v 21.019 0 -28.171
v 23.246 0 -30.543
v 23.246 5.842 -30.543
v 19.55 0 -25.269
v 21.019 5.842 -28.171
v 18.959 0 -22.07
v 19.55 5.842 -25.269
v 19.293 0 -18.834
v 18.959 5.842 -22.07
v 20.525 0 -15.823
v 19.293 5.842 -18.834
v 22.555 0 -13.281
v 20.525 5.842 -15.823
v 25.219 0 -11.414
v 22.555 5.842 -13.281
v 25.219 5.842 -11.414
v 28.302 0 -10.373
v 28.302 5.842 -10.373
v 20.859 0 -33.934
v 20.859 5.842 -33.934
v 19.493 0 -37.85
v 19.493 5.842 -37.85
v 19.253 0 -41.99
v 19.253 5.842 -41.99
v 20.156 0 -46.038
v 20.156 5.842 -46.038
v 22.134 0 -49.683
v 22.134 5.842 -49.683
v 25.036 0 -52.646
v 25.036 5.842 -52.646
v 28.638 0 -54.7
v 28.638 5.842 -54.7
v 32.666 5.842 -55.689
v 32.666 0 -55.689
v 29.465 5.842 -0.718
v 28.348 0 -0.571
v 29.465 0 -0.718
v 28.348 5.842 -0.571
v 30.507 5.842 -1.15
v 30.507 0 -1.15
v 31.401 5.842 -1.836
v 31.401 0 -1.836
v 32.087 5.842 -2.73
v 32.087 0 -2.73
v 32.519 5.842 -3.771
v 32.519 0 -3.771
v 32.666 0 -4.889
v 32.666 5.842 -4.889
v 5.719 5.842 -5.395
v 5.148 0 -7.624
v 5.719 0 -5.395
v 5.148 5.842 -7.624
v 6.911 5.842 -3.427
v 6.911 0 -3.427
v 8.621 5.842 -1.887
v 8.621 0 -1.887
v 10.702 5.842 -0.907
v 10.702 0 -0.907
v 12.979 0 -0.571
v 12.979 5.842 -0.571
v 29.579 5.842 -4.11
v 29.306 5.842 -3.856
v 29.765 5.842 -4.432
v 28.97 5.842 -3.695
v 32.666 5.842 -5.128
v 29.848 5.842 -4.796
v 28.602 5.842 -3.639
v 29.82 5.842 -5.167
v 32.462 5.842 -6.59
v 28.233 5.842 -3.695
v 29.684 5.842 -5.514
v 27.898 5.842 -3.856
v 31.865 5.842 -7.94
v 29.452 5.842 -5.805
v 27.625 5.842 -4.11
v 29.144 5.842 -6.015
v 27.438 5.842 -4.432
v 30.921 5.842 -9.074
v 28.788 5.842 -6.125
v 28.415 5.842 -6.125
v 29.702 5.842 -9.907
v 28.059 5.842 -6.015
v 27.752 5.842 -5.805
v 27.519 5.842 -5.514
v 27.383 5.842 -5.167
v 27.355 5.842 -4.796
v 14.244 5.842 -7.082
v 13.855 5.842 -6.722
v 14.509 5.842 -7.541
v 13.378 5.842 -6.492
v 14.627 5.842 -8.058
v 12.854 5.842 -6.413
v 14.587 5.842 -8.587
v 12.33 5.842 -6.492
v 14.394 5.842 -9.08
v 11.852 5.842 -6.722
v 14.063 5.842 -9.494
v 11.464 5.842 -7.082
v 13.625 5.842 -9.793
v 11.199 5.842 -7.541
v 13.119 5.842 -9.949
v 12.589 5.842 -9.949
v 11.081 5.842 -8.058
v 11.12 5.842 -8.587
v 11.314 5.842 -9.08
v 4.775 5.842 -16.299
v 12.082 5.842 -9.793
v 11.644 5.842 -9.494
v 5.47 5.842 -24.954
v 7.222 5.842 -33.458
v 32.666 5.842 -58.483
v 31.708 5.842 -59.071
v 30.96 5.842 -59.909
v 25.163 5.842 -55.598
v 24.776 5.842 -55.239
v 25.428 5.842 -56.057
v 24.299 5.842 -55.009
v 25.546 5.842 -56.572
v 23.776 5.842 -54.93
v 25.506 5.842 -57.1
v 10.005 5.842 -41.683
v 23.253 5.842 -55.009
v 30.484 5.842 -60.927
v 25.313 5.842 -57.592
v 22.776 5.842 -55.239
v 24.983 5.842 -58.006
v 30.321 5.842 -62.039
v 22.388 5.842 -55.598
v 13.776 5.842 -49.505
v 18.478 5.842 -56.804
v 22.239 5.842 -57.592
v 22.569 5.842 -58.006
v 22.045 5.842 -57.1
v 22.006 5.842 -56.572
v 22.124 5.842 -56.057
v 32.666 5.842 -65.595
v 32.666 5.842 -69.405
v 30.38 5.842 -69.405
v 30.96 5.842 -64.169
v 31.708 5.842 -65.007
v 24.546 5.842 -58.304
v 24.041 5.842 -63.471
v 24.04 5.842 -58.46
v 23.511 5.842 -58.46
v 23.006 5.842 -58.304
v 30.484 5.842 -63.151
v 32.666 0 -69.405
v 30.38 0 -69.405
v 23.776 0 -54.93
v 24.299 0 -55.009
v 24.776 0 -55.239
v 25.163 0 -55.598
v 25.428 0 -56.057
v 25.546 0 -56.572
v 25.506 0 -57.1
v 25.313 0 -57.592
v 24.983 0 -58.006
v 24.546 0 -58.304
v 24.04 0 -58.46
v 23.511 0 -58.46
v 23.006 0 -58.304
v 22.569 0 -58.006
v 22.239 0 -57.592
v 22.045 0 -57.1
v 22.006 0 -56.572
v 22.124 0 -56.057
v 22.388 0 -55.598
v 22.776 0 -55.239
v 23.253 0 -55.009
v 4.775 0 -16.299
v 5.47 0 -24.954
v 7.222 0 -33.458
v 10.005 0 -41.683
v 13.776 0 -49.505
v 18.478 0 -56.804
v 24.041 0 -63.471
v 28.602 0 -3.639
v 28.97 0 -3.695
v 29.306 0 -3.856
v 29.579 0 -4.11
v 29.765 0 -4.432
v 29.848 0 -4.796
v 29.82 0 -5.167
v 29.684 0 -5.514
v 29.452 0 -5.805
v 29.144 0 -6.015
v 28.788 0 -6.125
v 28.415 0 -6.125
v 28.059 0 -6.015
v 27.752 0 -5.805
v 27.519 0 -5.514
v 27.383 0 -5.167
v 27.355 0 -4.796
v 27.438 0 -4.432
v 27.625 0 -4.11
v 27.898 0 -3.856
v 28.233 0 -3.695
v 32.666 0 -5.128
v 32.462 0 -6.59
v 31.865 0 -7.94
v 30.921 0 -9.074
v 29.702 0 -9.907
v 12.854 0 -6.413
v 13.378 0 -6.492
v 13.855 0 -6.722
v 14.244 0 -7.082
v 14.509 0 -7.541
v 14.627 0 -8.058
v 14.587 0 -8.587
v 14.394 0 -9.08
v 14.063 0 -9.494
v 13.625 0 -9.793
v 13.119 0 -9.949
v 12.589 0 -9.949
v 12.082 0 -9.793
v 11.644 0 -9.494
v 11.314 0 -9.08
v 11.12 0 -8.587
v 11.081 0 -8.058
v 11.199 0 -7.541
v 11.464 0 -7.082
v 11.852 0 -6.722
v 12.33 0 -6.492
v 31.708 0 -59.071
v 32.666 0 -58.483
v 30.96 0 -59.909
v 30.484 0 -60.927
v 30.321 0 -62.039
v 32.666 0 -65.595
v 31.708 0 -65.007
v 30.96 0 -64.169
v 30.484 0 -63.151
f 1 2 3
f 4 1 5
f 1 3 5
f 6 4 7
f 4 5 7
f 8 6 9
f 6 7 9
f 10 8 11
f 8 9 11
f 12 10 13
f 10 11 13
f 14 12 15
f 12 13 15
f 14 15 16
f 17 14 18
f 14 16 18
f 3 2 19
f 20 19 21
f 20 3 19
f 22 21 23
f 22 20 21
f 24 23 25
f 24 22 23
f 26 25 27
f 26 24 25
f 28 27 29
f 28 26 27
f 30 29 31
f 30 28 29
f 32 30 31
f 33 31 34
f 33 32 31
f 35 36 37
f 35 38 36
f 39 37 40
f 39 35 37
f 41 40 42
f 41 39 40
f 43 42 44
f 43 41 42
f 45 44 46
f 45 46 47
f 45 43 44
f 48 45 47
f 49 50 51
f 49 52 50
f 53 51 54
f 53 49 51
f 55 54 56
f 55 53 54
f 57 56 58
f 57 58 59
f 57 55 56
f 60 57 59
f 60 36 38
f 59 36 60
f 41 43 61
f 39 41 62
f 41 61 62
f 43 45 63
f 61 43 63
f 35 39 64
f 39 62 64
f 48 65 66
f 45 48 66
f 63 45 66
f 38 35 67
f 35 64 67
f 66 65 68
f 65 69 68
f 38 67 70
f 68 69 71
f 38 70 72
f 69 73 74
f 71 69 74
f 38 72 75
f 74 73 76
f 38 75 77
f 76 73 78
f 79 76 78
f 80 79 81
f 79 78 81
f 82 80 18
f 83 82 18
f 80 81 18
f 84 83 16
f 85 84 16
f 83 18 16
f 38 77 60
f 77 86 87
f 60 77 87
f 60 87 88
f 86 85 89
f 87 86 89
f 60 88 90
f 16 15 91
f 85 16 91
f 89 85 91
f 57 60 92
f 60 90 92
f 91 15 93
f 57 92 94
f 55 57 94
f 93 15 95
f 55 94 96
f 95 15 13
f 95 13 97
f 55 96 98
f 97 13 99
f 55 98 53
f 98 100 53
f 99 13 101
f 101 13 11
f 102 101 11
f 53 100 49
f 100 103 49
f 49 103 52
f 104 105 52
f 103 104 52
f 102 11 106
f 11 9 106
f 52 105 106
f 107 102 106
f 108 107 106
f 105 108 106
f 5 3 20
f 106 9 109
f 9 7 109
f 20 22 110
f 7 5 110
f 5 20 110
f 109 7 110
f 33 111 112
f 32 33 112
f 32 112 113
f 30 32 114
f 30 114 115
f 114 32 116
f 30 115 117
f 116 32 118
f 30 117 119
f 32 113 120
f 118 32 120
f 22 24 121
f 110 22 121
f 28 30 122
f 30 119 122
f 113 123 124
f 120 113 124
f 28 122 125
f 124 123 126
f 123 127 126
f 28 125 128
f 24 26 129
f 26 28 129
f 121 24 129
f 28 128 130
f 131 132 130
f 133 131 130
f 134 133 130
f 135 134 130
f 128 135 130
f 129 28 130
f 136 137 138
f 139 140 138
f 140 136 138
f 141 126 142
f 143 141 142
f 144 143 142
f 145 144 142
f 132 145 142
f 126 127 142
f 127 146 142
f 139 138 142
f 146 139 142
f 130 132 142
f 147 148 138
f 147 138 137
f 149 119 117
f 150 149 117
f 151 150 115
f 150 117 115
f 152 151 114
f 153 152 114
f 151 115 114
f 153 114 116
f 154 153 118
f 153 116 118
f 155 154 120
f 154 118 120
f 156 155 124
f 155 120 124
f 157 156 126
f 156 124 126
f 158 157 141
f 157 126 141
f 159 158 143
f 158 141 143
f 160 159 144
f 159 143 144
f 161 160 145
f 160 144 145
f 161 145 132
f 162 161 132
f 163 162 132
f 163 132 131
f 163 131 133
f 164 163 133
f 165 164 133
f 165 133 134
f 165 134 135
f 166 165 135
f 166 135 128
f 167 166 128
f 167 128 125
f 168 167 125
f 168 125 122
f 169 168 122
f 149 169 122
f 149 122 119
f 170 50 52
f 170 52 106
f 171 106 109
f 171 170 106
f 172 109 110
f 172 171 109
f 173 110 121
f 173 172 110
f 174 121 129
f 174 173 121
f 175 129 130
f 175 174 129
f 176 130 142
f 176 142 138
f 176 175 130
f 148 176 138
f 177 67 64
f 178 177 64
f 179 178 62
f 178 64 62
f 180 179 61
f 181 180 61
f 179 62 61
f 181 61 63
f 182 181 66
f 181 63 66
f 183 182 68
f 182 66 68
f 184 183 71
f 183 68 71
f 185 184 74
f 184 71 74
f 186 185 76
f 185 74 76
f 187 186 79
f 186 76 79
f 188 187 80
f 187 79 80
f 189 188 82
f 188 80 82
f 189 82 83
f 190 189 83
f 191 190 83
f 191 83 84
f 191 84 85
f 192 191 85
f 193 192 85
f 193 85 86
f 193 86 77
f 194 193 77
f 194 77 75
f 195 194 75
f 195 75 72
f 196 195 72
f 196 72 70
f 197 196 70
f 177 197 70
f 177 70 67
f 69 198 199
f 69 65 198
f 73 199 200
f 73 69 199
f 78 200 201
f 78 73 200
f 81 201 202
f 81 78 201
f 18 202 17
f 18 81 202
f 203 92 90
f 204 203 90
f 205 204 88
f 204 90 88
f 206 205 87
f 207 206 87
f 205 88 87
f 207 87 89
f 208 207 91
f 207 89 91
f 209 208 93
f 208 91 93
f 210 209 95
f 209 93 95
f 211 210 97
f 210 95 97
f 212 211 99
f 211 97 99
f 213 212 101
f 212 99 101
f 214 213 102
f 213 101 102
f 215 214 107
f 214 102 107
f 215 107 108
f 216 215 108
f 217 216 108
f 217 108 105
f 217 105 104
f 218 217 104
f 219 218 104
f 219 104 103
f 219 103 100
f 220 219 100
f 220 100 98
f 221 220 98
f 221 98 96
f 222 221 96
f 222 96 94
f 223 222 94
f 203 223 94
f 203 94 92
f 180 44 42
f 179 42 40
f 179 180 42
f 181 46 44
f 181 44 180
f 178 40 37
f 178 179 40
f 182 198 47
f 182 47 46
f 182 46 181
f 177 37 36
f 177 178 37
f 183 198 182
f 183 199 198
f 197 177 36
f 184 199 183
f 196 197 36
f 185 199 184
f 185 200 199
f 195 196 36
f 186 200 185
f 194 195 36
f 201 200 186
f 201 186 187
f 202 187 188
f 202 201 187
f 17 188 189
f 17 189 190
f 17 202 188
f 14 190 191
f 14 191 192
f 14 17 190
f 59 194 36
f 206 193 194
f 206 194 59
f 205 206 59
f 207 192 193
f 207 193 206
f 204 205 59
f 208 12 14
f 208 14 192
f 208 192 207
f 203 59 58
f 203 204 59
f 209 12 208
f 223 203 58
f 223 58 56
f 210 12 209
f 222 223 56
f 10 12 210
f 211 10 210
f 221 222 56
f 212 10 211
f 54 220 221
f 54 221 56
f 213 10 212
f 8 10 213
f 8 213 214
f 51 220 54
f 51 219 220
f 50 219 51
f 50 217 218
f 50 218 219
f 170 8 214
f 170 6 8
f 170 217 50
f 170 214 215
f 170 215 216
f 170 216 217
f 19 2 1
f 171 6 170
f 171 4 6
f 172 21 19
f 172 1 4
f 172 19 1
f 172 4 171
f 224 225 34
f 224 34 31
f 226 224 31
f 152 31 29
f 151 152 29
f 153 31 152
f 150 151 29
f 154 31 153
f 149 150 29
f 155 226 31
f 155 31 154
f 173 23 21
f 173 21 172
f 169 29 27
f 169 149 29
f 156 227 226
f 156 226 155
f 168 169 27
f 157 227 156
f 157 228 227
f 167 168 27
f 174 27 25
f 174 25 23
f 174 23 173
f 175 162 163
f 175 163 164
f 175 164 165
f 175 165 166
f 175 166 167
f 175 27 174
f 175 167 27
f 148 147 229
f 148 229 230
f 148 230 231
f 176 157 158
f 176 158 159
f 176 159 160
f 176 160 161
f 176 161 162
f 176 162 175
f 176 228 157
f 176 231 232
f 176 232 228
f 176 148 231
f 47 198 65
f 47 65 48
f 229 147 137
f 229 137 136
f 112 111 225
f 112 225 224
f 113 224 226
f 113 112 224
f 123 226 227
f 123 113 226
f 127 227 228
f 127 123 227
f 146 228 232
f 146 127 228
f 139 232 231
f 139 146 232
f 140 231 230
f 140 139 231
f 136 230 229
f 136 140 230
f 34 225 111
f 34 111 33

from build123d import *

# Parameters (mm, degrees)
BOSS_EXTRUDE1_DEPTH = 5.842
CUT_EXTRUDE1_DEPTH  = 77.930082101
CUT_EXTRUDE2_DEPTH  = 77.930082101
SKETCH8_R           = 11.43
CUT_EXTRUDE3_DEPTH  = 77.930082101
FILLET1_R           = 7.874
FILLET2_R           = 4.318
FILLET4_R           = 5.334
SKETCH9_R           = 1.774805699
CUT_EXTRUDE4_DEPTH  = 77.930082101
SKETCH10_R          = 1.25
CUT_EXTRUDE5_DEPTH  = 77.930082101
SKETCH11_R          = 1.778
CUT_EXTRUDE6_DEPTH  = 77.930082101


with BuildPart() as part:
    # Sketch1 → Boss-Extrude1 (new body)
    with BuildSketch(Plane(origin=(0, 0, 0), x_dir=(1, 0, 0), z_dir=(0, 1, 0))):
        with BuildLine():
            Line((30.379802604, 69.40499916), (32.665802604, 69.40499916))
            Line((32.665802604, 69.40499916), (32.665802604, 0.57099916))
            Line((32.665802604, 0.57099916), (6.249802604, 0.57099916))
            ThreePointArc((6.249802604, 0.57099916), (8.73869024, 38.344938918), (30.379802604, 69.40499916))
        make_face()
    extrude(amount=BOSS_EXTRUDE1_DEPTH)

    # Sketch2 → Cut-Extrude1 (cut, through all)
    with BuildSketch(Plane(origin=(0, 5.842, 0), x_dir=(1, 0, 0), z_dir=(0, 1, 0))):
        with BuildLine():
            Line((32.665802604, 65.59499916), (32.665802604, 58.48299916))
            ThreePointArc((32.665802604, 58.48299916), (30.320989866, 62.03899916), (32.665802604, 65.59499916))
        make_face()
    extrude(amount=-CUT_EXTRUDE1_DEPTH, mode=Mode.SUBTRACT)

    # Sketch7 → Cut-Extrude2 (cut, through all)
    with BuildSketch(Plane(origin=(0, 5.842, 0), x_dir=(1, 0, 0), z_dir=(0, 1, 0))):
        with BuildLine():
            Line((32.665802604, 55.68899916), (32.665802604, 25.872384999))
            ThreePointArc((32.665802604, 25.872384999), (19.203802604, 40.780692079), (32.665802604, 55.68899916))
        make_face()
    extrude(amount=-CUT_EXTRUDE2_DEPTH, mode=Mode.SUBTRACT)

    # Sketch8 → Cut-Extrude3 (cut, through all)
    with BuildSketch(Plane(origin=(0, 5.842, 0), x_dir=(1, 0, 0), z_dir=(0, 1, 0))):
        with Locations((30.379802604, 21.612613445)):
            Circle(SKETCH8_R)
    extrude(amount=-CUT_EXTRUDE3_DEPTH, mode=Mode.SUBTRACT)

    # Fillet1
    fillet1_edges = [part.edges().sort_by_distance(p)[0] for p in [
        (6.249802604, 2.921, -0.57099916),
    ]]
    fillet(fillet1_edges, radius=FILLET1_R)

    # Fillet2
    fillet2_edges = [part.edges().sort_by_distance(p)[0] for p in [
        (32.665802604, 2.921, -0.57099916),
    ]]
    fillet(fillet2_edges, radius=FILLET2_R)

    # Fillet4
    fillet4_edges = [part.edges().sort_by_distance(p)[0] for p in [
        (32.665802604, 2.921, -10.413546341),
    ]]
    fillet(fillet4_edges, radius=FILLET4_R)

    # Sketch9 → Cut-Extrude4 (cut, through all)
    with BuildSketch(Plane(origin=(0, 5.842, 0), x_dir=(1, 0, 0), z_dir=(0, 1, 0))):
        with Locations(Location((23.775802604, 56.70499916, 0), (0, 0, 270))):
            Circle(SKETCH9_R)
    extrude(amount=-CUT_EXTRUDE4_DEPTH, mode=Mode.SUBTRACT)

    # Sketch10 → Cut-Extrude5 (cut, through all)
    with BuildSketch(Plane(origin=(0, 5.842, 0), x_dir=(1, 0, 0), z_dir=(0, 1, 0))):
        with Locations(Location((28.601802604, 4.88899916, 0), (0, 0, 270))):
            Circle(SKETCH10_R)
    extrude(amount=-CUT_EXTRUDE5_DEPTH, mode=Mode.SUBTRACT)

    # Sketch11 → Cut-Extrude6 (cut, through all)
    with BuildSketch(Plane(origin=(0, 5.842, 0), x_dir=(1, 0, 0), z_dir=(0, 1, 0))):
        with Locations(Location((12.853802604, 8.19099916, 0), (0, 0, 270))):
            Circle(SKETCH11_R)
    extrude(amount=-CUT_EXTRUDE6_DEPTH, mode=Mode.SUBTRACT)


solid = part.part
